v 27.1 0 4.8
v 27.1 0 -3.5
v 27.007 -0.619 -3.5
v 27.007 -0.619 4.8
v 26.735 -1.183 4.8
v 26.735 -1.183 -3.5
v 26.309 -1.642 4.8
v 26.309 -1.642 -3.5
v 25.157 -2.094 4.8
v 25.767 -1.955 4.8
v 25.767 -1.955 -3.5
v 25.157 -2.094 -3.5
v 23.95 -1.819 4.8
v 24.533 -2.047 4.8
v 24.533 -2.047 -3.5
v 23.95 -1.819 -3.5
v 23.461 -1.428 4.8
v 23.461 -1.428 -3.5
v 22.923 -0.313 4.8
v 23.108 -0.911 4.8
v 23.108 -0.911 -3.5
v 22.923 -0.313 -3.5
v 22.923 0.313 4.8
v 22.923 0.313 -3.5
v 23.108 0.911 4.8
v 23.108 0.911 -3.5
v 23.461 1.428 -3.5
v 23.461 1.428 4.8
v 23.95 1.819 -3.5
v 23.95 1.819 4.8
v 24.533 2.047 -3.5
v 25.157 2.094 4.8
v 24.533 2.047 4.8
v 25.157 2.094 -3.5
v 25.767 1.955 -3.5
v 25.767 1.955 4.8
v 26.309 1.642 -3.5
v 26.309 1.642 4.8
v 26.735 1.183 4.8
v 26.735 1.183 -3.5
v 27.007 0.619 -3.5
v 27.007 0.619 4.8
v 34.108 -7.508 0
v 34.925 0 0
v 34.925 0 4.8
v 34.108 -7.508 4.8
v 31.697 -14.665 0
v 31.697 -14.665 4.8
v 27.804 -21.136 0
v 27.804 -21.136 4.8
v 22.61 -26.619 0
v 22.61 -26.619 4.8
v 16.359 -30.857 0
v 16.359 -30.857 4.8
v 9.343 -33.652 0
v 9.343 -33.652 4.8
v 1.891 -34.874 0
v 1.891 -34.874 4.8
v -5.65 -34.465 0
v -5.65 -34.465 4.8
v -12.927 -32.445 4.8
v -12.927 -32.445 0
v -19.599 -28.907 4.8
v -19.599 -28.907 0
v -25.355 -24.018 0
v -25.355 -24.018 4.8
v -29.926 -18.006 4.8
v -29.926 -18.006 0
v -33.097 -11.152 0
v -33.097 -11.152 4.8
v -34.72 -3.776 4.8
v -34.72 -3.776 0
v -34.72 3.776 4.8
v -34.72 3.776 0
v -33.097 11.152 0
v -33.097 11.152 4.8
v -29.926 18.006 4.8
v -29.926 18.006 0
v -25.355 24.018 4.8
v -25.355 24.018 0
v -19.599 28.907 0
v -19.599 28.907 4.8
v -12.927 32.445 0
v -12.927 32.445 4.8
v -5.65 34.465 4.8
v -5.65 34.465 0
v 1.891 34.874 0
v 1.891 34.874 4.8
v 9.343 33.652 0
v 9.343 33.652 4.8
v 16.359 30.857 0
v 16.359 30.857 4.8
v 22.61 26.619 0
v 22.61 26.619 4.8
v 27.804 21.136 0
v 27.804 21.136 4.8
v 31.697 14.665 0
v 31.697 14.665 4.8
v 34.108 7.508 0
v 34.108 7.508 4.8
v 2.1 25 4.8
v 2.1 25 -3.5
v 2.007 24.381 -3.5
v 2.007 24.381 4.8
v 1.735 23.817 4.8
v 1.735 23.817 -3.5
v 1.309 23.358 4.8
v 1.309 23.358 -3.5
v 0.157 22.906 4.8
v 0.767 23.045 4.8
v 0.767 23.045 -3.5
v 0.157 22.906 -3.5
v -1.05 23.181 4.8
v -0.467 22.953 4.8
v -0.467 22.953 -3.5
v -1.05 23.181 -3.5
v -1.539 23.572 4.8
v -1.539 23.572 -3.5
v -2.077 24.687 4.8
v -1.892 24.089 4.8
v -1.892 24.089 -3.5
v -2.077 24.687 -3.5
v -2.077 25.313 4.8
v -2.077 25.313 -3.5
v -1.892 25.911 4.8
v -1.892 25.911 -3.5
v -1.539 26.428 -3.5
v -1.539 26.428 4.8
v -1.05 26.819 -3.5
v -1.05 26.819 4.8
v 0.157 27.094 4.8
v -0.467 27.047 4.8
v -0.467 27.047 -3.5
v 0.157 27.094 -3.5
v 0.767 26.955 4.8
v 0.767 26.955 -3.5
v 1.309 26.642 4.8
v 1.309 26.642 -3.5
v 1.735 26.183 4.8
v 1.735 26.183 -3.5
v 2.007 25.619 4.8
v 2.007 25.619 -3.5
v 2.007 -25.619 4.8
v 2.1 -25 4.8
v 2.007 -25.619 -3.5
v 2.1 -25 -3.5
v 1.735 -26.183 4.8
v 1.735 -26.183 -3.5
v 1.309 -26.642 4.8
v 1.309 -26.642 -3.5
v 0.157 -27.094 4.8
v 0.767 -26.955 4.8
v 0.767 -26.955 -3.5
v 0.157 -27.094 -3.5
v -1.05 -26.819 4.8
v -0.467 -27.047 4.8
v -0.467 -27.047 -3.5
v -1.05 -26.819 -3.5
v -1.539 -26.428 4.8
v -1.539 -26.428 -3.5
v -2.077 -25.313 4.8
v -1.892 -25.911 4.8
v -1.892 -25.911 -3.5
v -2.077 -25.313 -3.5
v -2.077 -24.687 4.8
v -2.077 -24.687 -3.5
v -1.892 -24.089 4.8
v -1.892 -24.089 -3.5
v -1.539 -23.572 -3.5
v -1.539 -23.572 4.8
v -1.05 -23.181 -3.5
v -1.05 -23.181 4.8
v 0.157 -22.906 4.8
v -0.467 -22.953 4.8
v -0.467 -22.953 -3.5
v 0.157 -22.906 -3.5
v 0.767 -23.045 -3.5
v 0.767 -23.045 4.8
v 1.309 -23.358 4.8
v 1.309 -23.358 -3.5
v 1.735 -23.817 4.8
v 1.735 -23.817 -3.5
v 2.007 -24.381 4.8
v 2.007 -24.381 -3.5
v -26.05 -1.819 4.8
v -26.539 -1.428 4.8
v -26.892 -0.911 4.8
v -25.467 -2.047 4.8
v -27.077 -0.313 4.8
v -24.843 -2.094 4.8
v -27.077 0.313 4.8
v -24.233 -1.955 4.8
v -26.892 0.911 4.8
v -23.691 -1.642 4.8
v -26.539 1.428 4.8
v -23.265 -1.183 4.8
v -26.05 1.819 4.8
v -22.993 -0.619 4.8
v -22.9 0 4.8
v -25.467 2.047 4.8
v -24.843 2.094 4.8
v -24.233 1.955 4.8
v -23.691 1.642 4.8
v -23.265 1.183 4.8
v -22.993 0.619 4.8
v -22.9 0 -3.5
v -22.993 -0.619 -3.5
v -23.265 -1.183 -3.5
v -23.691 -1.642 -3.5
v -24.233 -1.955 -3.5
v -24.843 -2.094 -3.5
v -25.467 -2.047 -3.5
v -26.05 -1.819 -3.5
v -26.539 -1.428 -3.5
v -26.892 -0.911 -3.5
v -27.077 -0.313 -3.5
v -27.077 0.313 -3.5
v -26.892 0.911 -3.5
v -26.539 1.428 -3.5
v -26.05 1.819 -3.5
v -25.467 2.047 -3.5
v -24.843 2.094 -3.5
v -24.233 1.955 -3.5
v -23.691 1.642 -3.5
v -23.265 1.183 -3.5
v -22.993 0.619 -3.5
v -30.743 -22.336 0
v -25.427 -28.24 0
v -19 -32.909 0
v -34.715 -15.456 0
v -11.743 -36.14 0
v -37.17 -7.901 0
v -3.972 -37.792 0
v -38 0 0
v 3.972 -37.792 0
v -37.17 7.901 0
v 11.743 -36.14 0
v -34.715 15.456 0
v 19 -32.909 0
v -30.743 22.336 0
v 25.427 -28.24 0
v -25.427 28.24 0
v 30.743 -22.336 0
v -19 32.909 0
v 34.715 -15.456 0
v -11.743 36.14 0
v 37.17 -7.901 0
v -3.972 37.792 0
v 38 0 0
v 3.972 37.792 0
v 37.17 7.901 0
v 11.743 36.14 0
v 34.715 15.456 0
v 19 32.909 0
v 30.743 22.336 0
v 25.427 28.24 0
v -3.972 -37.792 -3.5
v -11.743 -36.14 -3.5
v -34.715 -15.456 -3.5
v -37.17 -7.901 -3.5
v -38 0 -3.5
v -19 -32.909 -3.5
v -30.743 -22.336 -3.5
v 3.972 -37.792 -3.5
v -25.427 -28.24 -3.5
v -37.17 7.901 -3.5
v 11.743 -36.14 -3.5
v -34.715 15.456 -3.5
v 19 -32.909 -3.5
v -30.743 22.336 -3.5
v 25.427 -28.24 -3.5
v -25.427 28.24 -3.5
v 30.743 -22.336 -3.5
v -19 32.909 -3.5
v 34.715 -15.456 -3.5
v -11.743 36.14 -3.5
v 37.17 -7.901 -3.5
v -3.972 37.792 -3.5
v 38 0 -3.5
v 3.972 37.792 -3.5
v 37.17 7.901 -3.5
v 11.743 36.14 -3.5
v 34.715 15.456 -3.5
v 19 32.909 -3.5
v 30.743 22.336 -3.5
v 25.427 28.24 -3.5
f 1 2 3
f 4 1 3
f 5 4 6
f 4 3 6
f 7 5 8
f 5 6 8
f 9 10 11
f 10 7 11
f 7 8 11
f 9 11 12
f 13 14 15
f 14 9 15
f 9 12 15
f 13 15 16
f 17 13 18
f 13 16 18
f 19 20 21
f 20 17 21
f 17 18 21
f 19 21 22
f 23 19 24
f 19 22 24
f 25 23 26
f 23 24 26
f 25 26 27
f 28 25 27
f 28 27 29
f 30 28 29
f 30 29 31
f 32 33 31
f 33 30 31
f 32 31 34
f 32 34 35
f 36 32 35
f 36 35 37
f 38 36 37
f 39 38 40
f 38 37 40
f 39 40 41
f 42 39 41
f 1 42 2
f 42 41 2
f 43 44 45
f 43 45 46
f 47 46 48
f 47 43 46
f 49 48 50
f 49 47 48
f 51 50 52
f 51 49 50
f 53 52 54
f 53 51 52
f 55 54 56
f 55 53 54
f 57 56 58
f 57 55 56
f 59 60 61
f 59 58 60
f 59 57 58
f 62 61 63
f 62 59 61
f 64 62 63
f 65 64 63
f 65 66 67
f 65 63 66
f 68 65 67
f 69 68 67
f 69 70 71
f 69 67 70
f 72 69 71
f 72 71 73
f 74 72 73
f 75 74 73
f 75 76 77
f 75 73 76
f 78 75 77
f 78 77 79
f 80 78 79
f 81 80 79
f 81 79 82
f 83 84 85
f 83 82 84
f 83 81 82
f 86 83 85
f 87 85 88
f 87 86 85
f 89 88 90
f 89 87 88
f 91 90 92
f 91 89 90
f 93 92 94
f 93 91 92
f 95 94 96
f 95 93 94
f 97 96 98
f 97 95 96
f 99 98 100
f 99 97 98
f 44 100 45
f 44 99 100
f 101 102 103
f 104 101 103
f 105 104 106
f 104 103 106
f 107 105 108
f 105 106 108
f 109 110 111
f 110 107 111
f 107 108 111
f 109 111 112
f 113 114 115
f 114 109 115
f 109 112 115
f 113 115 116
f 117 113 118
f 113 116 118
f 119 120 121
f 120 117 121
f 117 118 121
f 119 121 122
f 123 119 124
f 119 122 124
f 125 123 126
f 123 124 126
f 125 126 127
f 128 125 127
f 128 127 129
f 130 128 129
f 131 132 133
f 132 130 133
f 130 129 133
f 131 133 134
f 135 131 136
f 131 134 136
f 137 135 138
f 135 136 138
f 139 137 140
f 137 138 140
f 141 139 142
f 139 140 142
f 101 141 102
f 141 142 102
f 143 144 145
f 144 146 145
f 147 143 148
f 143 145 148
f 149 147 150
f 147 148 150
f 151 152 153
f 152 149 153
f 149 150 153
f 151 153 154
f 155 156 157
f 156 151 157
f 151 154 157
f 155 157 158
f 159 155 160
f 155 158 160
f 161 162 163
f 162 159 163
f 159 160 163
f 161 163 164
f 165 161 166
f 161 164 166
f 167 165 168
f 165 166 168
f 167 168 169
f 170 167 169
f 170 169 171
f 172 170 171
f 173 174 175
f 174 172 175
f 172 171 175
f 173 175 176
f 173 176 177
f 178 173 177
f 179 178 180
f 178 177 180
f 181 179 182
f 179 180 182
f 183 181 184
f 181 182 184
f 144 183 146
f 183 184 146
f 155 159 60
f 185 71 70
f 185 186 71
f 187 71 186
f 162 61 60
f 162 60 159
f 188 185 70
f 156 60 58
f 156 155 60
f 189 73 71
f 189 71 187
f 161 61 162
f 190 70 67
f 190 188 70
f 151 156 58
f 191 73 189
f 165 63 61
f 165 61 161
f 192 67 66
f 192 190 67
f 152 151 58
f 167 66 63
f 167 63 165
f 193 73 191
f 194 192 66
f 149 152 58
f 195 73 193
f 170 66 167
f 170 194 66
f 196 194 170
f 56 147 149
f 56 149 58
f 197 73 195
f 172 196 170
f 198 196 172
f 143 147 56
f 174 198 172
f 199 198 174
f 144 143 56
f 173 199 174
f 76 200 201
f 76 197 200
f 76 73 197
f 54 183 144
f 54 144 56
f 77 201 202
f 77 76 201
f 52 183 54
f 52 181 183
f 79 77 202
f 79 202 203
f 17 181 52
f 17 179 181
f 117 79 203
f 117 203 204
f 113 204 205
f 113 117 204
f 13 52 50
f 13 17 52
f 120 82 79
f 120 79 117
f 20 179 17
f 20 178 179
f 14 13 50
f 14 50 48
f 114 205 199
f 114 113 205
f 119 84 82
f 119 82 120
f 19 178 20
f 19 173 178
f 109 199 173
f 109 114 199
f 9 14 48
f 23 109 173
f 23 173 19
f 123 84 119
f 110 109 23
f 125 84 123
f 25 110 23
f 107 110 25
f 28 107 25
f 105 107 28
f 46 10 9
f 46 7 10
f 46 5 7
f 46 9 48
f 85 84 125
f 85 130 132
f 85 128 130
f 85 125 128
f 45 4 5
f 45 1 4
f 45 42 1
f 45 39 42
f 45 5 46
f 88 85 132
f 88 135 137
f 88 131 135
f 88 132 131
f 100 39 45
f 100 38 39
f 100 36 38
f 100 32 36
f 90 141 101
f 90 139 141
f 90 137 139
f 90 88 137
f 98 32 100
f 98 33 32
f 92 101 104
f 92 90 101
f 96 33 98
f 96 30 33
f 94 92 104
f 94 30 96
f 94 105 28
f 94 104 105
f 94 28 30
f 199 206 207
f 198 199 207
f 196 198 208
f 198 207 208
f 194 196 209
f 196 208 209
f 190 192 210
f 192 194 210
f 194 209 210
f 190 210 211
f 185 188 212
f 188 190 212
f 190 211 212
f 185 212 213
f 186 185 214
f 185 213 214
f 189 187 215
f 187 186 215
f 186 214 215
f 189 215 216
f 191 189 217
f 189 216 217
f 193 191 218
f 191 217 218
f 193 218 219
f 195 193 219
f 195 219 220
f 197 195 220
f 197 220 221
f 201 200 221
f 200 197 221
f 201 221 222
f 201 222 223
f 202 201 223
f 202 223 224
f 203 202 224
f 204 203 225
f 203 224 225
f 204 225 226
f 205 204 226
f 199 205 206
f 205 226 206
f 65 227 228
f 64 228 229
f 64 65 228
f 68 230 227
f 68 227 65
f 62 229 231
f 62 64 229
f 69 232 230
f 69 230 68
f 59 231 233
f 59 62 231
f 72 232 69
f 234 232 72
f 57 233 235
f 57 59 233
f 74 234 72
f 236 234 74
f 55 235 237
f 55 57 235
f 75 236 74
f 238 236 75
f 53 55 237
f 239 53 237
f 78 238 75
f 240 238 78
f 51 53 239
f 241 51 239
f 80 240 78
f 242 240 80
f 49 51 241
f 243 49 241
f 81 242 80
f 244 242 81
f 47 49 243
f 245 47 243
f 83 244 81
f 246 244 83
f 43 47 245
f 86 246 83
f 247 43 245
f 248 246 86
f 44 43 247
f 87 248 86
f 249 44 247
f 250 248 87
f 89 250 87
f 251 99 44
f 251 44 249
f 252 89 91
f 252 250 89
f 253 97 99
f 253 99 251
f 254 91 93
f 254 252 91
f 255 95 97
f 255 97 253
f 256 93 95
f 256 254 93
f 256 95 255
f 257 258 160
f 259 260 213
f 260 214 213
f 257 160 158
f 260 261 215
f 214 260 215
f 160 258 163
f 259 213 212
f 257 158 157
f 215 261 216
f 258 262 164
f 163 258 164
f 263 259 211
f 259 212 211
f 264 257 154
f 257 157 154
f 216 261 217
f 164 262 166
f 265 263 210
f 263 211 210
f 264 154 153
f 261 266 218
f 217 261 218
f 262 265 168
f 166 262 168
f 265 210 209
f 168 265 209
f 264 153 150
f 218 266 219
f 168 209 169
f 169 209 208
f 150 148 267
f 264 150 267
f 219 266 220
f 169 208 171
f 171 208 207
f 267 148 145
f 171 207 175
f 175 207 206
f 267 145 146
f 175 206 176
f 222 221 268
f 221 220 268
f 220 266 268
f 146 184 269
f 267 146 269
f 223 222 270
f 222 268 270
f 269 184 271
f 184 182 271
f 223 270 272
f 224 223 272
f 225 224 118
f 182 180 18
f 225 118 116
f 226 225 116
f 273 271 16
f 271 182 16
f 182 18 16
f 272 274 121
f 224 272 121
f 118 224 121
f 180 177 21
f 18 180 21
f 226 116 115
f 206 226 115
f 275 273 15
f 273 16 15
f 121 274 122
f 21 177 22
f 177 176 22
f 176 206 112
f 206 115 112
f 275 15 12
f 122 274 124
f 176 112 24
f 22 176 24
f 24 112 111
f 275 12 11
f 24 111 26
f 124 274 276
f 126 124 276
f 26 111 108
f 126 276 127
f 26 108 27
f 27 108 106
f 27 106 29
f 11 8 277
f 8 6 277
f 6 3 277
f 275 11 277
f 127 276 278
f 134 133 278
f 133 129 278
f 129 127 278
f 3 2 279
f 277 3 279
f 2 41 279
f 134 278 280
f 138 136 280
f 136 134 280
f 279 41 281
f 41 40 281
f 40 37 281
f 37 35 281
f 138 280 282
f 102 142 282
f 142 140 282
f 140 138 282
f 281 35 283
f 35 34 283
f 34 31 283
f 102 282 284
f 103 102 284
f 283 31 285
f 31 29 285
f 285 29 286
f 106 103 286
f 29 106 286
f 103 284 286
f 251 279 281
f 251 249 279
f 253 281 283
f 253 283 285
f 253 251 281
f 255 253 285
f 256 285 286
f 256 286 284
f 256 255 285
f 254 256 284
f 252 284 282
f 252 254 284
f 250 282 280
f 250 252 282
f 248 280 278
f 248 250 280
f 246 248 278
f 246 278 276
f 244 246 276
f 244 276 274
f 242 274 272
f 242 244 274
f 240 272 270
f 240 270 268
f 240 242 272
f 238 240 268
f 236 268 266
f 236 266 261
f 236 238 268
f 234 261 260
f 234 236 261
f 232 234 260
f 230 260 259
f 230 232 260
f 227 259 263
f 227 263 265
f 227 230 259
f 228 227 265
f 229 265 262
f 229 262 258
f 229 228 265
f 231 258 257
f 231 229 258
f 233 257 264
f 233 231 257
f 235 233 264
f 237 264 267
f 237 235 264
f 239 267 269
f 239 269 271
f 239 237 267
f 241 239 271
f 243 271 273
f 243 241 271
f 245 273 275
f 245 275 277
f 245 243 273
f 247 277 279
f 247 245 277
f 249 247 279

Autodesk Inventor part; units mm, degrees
ref_plane "YZ Plane" through (0, 0, 0) normal (1, 0, 0) x (0, 1, 0)
ref_plane "XZ Plane" through (0, 0, 0) normal (0, 1, 0) x (-1, 0, 0)
ref_plane "XY Plane" through (0, 0, 0) normal (0, 0, 1) x (1, 0, 0)
sketch "Sketch1" plane through (0, 0, 0) normal (0, 0, 1) x (1, 0, 0)
  circle A0 centre (0, 0) radius 34.925
  circle A1 centre (0, 0) radius 38
  circle A2 centre (-25, 0) radius 2.1
  circle A3 centre (0, -25) radius 2.1
  circle A4 centre (25, 0) radius 2.1
  circle A5 centre (0, 25) radius 2.1
  dimension "d0" = 69.85
  dimension "d1" = 76
  dimension "d6" = 25
  dimension "d7" = 4.2
  dimension "d10" = 360
extrude "Extrusion1" add sketch "Sketch1" along normal blind 4.8 contours A0
extrude "Extrusion2" add sketch "Sketch1" against normal blind 3.5 contours A0 | A1
properties part number "Fix_toDown_bearing" material "PLA Plastic"
